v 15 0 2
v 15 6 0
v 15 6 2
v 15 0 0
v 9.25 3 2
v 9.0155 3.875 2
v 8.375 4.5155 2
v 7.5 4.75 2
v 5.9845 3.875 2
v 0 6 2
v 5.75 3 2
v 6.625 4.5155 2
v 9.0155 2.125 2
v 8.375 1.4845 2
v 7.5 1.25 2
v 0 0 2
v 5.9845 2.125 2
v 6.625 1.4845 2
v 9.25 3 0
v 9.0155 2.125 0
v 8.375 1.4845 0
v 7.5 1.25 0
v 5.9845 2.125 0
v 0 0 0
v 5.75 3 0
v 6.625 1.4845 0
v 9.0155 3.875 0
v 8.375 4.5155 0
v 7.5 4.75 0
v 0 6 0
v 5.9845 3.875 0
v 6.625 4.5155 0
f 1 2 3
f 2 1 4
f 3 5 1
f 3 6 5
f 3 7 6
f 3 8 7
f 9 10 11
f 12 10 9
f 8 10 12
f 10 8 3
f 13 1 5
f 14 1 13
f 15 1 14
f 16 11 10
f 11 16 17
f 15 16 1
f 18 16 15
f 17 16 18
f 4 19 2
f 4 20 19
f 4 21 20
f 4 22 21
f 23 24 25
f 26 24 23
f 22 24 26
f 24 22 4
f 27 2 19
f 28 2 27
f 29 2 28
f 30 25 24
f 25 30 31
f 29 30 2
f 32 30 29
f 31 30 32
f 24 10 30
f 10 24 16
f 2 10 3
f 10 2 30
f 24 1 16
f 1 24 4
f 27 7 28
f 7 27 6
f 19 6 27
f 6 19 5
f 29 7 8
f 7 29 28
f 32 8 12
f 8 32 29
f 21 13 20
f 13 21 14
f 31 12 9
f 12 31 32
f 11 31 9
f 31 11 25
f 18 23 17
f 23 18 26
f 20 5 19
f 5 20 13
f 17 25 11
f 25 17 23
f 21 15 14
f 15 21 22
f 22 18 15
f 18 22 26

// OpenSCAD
difference()
{
    union()
    {
        cube([15,6,2]);
    }
    union()
    {
        translate([15/2,6/2,0])
            cylinder(d=3.5,h=2,$fn=12);
    }
}
